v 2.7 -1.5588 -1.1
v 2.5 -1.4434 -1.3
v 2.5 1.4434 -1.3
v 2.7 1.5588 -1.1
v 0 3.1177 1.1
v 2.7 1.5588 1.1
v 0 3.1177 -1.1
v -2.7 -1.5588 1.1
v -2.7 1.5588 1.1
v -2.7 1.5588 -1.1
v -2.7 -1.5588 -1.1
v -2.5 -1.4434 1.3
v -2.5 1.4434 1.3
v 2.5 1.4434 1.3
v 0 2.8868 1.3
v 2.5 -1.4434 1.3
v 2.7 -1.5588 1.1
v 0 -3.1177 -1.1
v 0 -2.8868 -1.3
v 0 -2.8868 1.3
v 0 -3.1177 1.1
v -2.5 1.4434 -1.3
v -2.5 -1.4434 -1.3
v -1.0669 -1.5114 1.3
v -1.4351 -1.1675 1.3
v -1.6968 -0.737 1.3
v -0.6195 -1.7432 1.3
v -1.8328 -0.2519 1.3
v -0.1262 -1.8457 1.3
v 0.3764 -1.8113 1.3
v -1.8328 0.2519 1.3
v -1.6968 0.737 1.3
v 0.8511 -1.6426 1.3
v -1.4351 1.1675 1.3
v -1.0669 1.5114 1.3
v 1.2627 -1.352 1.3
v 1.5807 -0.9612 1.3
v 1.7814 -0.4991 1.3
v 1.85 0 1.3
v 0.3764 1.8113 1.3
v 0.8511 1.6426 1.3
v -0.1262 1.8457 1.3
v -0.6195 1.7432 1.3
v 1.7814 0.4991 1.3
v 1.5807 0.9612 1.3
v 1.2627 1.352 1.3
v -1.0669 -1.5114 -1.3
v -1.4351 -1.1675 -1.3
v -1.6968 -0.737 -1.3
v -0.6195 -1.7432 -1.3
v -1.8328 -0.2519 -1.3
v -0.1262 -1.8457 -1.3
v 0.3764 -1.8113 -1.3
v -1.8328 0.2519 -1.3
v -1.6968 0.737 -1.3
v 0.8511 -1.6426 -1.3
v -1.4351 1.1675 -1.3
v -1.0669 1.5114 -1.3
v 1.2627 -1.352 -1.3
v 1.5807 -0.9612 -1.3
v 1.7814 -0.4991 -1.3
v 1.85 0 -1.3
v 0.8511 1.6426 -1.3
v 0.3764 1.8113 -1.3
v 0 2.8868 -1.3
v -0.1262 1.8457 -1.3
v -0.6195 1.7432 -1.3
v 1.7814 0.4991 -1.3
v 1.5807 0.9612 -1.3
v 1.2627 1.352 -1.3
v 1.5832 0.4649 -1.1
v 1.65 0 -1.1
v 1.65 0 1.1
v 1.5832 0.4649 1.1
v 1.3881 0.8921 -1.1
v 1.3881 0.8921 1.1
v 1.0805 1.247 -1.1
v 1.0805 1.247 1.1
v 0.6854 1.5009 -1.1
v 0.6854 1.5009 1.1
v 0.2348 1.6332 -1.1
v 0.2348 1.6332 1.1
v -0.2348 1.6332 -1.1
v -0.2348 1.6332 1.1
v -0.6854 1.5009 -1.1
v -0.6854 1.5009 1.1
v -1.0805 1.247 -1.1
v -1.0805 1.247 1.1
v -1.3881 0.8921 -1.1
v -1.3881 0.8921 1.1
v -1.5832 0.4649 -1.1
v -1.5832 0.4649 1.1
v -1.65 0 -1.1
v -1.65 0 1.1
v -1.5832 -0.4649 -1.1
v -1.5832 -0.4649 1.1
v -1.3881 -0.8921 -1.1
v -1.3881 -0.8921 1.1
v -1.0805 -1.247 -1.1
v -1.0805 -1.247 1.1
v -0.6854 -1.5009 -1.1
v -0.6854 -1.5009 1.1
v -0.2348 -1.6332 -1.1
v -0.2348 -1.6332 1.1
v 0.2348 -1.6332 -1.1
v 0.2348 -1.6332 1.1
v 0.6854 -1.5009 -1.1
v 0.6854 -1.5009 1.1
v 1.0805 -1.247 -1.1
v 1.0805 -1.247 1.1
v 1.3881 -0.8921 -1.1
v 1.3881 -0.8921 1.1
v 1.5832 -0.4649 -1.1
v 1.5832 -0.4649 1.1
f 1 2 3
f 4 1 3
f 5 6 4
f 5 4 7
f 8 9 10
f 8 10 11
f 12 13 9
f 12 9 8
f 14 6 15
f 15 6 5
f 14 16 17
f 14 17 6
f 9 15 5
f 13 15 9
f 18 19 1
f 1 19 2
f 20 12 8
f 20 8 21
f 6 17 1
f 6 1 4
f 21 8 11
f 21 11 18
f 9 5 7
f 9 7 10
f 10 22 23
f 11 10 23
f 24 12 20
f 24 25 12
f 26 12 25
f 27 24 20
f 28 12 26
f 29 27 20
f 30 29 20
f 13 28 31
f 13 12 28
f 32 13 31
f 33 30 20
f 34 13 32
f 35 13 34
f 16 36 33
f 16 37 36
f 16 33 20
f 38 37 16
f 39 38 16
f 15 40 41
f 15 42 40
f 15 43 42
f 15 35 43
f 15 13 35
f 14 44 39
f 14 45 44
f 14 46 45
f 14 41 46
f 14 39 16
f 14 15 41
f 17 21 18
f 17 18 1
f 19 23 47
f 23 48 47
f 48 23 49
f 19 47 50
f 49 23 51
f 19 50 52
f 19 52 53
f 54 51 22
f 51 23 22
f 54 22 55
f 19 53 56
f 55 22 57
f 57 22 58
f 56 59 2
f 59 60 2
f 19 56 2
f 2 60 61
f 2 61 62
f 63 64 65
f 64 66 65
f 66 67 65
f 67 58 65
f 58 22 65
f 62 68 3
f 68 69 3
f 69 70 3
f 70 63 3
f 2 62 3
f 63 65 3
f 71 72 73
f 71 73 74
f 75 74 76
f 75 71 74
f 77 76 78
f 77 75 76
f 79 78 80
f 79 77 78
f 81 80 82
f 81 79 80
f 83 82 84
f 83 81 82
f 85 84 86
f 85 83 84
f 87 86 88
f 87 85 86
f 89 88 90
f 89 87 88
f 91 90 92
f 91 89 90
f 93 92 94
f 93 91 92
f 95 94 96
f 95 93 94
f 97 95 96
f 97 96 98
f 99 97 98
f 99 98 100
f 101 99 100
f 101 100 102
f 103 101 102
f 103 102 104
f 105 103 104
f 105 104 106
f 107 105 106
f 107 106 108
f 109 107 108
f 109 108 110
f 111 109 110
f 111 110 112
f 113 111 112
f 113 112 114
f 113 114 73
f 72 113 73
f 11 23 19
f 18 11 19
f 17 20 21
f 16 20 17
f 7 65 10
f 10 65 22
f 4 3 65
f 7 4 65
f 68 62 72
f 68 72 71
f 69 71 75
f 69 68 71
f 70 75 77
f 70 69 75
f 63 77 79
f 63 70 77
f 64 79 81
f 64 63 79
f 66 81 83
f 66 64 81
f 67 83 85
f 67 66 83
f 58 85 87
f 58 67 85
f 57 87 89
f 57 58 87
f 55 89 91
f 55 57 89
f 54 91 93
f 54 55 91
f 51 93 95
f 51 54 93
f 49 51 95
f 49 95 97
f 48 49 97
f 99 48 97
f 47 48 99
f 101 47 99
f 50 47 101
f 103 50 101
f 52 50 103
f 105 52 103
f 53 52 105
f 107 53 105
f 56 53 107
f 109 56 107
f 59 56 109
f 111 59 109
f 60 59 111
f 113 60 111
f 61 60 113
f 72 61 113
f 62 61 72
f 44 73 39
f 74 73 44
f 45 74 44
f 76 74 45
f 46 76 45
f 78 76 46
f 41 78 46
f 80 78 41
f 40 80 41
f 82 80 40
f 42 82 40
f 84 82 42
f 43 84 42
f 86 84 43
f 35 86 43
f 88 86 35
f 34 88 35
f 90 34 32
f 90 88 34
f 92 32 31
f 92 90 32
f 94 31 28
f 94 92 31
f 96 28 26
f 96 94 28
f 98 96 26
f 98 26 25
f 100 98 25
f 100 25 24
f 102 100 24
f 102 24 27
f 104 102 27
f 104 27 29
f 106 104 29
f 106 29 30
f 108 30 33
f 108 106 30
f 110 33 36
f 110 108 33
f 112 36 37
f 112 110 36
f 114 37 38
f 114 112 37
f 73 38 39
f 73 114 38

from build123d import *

# Parameters (mm, degrees)
SKETCH1_R           = 1.65
BOSS_EXTRUDE1_DEPTH = 1.3
DEBURS_SIZE         = 0.2


with BuildPart() as part:
    # Sketch1 → Boss-Extrude1 (new, symmetric)
    with BuildSketch(Plane.XY):
        Polygon((2.7, -1.558845727), (2.7, 1.558845727), (0, 3.117691454), (-2.7, 1.558845727), (-2.7, -1.558845727), (0, -3.117691454), align=None)
        Circle(SKETCH1_R, mode=Mode.SUBTRACT)
    extrude(amount=BOSS_EXTRUDE1_DEPTH, both=True)

    # Deburs
    deburs_edges = [part.edges().sort_by_distance(p)[0] for p in [
        (1.35, 2.33826859, 1.3),
        (-1.35, 2.33826859, 1.3),
        (-1.65, 0, -1.3),
        (-1.65, 0, 1.3),
        (-2.7, 0, 1.3),
        (-1.35, -2.33826859, 1.3),
        (1.35, -2.33826859, 1.3),
        (-1.35, -2.33826859, -1.3),
        (-2.7, 0, -1.3),
        (-1.35, 2.33826859, -1.3),
        (1.35, 2.33826859, -1.3),
        (2.7, 0, -1.3),
        (1.35, -2.33826859, -1.3),
        (2.7, 0, 1.3),
    ]]
    chamfer(deburs_edges, length=DEBURS_SIZE)


solid = part.part
